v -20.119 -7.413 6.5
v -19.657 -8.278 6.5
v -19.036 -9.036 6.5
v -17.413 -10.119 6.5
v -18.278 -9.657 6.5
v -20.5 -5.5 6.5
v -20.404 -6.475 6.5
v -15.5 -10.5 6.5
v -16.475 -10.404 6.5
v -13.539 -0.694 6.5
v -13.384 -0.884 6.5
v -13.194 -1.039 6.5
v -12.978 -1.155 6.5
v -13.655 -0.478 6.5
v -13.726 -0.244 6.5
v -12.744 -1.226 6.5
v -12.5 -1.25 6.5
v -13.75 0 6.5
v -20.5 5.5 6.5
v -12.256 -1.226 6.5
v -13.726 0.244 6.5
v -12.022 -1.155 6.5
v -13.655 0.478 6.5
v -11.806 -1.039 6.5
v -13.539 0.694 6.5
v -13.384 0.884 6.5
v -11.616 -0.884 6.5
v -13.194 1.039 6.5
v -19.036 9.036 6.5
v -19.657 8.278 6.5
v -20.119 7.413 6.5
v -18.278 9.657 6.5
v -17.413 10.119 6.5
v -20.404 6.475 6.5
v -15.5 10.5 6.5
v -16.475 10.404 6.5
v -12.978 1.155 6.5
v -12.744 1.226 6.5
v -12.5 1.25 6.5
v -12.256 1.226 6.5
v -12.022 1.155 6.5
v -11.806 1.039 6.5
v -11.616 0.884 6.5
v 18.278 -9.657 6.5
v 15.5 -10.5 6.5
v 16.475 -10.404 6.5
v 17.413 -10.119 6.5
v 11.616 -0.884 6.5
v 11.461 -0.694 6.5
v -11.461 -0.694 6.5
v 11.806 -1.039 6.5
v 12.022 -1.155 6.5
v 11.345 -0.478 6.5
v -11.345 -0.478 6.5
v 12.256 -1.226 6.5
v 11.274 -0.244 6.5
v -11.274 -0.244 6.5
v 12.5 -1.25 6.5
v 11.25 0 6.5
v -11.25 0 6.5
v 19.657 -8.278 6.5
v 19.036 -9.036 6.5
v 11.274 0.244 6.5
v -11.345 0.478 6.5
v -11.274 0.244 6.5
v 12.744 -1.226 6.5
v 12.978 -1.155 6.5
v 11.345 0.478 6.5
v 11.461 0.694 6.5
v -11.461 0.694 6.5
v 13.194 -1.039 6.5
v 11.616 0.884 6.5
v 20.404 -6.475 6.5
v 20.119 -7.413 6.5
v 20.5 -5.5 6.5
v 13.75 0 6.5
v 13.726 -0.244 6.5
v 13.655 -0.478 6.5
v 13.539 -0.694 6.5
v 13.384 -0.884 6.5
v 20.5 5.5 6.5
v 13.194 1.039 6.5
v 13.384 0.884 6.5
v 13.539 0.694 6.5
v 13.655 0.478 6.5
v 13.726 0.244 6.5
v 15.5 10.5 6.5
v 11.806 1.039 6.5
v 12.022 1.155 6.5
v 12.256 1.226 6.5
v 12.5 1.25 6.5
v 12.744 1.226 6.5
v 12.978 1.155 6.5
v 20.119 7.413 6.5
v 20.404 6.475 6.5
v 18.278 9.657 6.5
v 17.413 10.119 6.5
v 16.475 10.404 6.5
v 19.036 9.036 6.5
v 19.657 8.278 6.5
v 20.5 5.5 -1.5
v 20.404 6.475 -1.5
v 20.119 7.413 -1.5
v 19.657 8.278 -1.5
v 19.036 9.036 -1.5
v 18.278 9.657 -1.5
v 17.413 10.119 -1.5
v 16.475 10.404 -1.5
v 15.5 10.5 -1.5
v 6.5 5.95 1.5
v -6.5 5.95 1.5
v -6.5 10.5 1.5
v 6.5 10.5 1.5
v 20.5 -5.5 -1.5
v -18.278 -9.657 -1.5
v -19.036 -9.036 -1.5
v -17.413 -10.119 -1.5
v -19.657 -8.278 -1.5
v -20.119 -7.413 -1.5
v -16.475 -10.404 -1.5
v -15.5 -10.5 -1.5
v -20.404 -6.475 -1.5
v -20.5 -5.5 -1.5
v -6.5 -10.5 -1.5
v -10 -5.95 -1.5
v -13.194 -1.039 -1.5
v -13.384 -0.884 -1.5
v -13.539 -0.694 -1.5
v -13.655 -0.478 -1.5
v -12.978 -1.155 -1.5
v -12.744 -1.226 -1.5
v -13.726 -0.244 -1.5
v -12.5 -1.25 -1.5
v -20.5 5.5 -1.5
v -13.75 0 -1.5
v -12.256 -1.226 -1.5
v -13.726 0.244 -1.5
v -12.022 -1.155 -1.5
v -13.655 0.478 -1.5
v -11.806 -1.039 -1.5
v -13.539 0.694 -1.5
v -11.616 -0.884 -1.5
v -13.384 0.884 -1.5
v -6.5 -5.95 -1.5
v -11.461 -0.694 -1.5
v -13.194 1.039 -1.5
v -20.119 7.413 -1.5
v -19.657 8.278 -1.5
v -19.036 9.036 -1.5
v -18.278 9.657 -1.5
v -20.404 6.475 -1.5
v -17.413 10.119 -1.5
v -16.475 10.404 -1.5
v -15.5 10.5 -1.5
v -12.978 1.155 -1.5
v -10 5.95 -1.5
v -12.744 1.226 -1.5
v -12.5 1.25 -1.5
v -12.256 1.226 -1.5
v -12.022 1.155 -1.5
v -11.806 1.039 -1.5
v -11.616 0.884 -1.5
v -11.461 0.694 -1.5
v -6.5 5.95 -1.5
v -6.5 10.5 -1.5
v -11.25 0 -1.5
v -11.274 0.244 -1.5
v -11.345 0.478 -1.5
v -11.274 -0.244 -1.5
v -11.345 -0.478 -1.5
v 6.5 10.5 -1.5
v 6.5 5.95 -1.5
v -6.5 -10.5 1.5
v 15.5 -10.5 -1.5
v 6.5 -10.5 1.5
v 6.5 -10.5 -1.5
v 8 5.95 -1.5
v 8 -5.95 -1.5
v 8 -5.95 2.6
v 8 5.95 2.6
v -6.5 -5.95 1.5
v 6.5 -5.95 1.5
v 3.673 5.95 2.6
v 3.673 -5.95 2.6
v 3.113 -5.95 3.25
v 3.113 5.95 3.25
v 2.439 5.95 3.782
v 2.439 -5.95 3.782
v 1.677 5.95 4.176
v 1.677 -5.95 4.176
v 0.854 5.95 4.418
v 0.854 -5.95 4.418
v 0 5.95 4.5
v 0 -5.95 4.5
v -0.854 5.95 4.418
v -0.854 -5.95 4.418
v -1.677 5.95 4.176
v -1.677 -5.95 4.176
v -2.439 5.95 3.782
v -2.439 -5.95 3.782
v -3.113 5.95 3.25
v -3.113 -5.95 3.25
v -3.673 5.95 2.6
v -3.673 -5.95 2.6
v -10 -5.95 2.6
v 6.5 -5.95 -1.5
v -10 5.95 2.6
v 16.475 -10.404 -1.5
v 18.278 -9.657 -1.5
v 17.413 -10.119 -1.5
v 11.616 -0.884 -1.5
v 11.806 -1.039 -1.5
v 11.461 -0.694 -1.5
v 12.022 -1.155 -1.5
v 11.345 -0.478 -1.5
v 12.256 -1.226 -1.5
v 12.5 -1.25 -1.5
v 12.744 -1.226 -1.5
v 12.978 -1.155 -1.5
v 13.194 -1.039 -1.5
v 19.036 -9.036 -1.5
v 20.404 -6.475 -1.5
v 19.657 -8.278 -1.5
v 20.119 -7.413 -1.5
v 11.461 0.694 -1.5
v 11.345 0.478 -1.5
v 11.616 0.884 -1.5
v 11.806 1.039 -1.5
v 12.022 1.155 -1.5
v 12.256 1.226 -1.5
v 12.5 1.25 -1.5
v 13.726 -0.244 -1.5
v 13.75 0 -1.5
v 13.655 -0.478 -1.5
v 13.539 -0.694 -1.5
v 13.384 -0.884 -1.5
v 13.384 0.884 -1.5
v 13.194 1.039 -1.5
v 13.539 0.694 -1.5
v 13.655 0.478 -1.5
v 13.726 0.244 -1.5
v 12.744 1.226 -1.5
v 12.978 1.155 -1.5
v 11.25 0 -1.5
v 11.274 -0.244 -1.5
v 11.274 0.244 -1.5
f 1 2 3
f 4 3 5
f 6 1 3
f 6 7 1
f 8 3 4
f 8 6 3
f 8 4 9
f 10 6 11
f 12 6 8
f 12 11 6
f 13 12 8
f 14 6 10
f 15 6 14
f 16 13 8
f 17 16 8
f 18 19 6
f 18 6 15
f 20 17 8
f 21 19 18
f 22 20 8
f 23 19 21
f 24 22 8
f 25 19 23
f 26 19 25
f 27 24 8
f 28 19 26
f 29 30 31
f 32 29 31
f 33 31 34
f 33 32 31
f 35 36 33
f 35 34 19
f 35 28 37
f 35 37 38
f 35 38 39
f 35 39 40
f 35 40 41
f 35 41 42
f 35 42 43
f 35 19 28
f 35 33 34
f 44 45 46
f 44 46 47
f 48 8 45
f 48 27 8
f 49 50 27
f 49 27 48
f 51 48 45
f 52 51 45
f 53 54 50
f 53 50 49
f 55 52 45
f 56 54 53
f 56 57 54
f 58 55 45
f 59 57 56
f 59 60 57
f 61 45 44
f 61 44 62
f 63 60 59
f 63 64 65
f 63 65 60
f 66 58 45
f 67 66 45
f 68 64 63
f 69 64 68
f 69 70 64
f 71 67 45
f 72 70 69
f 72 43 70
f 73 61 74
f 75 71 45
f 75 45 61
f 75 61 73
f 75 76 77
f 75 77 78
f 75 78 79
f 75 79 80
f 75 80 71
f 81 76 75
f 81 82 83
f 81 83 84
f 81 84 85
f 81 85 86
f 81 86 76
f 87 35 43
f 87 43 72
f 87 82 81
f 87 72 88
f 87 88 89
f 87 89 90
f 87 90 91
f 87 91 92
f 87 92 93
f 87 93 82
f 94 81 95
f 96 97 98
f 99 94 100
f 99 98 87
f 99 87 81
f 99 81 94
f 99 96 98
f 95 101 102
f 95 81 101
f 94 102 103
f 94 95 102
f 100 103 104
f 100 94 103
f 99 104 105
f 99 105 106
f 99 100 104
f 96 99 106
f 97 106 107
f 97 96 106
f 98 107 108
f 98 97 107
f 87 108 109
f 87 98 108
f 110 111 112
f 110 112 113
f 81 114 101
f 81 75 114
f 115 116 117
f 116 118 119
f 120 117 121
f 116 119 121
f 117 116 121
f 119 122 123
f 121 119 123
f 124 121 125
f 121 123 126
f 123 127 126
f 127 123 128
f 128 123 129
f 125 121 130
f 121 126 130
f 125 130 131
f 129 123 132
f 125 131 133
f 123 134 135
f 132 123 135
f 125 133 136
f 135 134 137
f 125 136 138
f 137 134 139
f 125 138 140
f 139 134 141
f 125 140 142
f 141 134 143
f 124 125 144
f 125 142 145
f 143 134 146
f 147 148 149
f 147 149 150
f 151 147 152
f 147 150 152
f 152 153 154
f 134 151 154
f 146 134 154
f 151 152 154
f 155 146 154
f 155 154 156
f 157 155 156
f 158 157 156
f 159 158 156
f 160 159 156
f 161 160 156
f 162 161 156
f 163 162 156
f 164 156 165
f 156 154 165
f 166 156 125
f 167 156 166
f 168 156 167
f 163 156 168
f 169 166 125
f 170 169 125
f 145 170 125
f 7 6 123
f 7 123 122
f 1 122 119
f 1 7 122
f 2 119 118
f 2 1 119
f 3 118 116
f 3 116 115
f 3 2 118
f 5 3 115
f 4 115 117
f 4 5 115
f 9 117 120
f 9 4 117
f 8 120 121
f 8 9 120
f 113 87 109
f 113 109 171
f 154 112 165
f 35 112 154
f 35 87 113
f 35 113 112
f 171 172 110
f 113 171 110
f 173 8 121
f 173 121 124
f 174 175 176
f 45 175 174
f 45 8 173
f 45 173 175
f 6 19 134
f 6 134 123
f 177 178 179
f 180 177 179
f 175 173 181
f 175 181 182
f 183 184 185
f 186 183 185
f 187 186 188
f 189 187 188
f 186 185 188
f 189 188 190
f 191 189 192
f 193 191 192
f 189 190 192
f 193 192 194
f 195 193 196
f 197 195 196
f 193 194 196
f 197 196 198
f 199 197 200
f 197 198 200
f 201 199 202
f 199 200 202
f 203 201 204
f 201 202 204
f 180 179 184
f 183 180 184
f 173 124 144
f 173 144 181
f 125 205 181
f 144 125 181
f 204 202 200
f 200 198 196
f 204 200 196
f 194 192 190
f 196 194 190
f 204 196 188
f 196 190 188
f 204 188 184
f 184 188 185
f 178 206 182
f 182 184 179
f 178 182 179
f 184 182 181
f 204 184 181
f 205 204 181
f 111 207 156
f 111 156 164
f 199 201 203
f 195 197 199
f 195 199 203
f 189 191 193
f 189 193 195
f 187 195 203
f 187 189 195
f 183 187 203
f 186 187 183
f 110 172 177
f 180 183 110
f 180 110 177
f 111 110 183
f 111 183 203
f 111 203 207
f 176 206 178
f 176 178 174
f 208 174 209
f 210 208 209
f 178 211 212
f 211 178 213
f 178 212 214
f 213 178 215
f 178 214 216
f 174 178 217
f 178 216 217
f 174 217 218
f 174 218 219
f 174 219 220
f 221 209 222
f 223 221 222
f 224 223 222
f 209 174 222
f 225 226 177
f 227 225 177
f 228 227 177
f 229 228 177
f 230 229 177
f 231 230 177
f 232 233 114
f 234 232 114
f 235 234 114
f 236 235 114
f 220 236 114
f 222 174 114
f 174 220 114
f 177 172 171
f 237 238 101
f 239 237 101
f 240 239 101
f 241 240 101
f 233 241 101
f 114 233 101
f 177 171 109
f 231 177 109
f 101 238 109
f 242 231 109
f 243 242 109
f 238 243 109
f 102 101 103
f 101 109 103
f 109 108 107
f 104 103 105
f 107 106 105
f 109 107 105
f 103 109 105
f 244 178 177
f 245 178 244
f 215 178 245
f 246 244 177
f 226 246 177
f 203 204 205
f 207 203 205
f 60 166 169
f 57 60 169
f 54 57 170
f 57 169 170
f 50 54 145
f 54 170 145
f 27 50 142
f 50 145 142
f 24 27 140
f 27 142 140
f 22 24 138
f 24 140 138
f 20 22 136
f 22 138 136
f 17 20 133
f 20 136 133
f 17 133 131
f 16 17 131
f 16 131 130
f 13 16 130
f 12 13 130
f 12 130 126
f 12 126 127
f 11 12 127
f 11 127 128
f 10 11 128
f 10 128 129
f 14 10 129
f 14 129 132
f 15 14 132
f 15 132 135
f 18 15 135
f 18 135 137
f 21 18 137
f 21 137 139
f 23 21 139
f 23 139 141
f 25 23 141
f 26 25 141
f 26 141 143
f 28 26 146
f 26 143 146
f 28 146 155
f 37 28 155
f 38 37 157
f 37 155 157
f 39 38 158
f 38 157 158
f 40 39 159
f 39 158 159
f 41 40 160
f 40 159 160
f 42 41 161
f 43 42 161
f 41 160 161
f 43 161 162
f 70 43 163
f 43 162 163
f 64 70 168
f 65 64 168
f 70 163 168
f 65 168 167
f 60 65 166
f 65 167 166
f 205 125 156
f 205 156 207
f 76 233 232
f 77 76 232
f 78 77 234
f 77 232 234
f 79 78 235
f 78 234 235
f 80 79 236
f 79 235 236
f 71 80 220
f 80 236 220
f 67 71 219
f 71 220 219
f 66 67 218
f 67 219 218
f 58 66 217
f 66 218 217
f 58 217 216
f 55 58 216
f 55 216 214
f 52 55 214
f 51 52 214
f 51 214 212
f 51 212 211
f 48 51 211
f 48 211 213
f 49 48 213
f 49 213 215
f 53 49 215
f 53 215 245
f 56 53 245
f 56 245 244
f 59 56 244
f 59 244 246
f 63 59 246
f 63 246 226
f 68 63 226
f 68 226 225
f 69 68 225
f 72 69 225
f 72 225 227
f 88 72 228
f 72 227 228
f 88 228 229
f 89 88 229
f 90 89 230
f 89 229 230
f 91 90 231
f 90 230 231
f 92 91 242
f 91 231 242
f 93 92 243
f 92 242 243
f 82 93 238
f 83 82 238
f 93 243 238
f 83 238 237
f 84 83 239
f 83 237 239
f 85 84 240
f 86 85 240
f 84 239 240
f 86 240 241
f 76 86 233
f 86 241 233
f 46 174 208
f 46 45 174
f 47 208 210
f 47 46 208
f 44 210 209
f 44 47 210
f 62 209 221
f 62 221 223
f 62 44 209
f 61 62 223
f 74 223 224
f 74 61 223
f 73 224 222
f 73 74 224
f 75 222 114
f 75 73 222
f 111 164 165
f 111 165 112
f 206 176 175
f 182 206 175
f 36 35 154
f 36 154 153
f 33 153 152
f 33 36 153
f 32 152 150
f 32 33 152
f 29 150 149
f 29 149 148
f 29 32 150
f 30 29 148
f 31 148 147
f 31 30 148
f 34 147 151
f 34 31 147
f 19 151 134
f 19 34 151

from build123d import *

# Parameters (mm, degrees)
F2_DEPTH      = 6.5
F2_DEPTH_BACK = 1.5
F3_W          = 2
F3_H          = 5.2
F4_DEPTH      = 5.95
F5_W          = 13
F5_H          = 3
F6_DEPTH      = 12.5
F7_R          = 1.25
F8_DEPTH      = 10


with BuildPart() as f2:
    # F1 (on Top) → F2 (new body, two sides)
    with BuildSketch(Plane.XY) as f2_sk:
        with BuildLine():
            ThreePointArc((20.5, 5.5), (19.0355339059, 9.0355339059), (15.5, 10.5))
            Line((15.5, 10.5), (-15.5, 10.5))
            ThreePointArc((-15.5, 10.5), (-19.0355339059, 9.0355339059), (-20.5, 5.5))
            Line((-20.5, 5.5), (-20.5, -5.5))
            ThreePointArc((-20.5, -5.5), (-19.0355339059, -9.0355339059), (-15.5, -10.5))
            Line((-15.5, -10.5), (15.5, -10.5))
            ThreePointArc((15.5, -10.5), (19.0355339059, -9.0355339059), (20.5, -5.5))
            Line((20.5, -5.5), (20.5, 5.5))
        make_face()
    extrude(amount=F2_DEPTH)
    extrude(f2_sk.sketch, amount=-F2_DEPTH_BACK)

    # F3 (on Front) → F4 (cut, symmetric)
    with BuildSketch(Plane.XZ):
        with BuildLine():
            ThreePointArc((3.6728735344, -2.6), (4.2882357039, -1.3641974005), (4.5, 0))
            ThreePointArc((4.5, 0), (4.2882357039, 1.3641974005), (3.6728735344, 2.6))
            Line((3.6728735344, 2.6), (-3.6728735344, 2.6))
            ThreePointArc((-3.6728735344, 2.6), (-4.5, 0), (-3.6728735344, -2.6))
            Line((-3.6728735344, -2.6), (3.6728735344, -2.6))
        make_face()
        with BuildLine():
            ThreePointArc((3.6728735344, 2.6), (4.2882357039, 1.3641974005), (4.5, 0))
            ThreePointArc((4.5, 0), (4.2882357039, -1.3641974005), (3.6728735344, -2.6))
            Line((3.6728735344, -2.6), (8, -2.6))
            Line((8, -2.6), (8, 2.6))
            Line((8, 2.6), (3.6728735344, 2.6))
        make_face()
        with BuildLine():
            Line((-3.6728735344, 2.6), (3.6728735344, 2.6))
            ThreePointArc((3.6728735344, 2.6), (0, 4.5), (-3.6728735344, 2.6))
        make_face()
        with BuildLine():
            ThreePointArc((-3.6728735344, -2.6), (0, -4.5), (3.6728735344, -2.6))
            Line((3.6728735344, -2.6), (-3.6728735344, -2.6))
        make_face()
        with BuildLine():
            ThreePointArc((-3.6728735344, -2.6), (-4.5, 0), (-3.6728735344, 2.6))
            Line((-3.6728735344, 2.6), (-8, 2.6))
            Line((-8, 2.6), (-8, -2.6))
            Line((-8, -2.6), (-3.6728735344, -2.6))
        make_face()
        with Locations((-9, 0)):
            Rectangle(F3_W, F3_H)
    extrude(amount=F4_DEPTH, both=True, mode=Mode.SUBTRACT)

    # F5 (on Front) → F6 (cut, symmetric)
    with BuildSketch(Plane.XZ):
        Rectangle(F5_W, F5_H)
    extrude(amount=F6_DEPTH, both=True, mode=Mode.SUBTRACT)

    # F7 (on face) → F8 (cut)
    with BuildSketch(Plane(origin=(0, 0, -1.5), x_dir=(1, 0, 0), z_dir=(0, 0, -1))):
        with Locations((-12.5, 0)):
            Circle(F7_R)
        with Locations((12.5, 0)):
            Circle(F7_R)
    extrude(amount=-F8_DEPTH, mode=Mode.SUBTRACT)


solid = f2.part
